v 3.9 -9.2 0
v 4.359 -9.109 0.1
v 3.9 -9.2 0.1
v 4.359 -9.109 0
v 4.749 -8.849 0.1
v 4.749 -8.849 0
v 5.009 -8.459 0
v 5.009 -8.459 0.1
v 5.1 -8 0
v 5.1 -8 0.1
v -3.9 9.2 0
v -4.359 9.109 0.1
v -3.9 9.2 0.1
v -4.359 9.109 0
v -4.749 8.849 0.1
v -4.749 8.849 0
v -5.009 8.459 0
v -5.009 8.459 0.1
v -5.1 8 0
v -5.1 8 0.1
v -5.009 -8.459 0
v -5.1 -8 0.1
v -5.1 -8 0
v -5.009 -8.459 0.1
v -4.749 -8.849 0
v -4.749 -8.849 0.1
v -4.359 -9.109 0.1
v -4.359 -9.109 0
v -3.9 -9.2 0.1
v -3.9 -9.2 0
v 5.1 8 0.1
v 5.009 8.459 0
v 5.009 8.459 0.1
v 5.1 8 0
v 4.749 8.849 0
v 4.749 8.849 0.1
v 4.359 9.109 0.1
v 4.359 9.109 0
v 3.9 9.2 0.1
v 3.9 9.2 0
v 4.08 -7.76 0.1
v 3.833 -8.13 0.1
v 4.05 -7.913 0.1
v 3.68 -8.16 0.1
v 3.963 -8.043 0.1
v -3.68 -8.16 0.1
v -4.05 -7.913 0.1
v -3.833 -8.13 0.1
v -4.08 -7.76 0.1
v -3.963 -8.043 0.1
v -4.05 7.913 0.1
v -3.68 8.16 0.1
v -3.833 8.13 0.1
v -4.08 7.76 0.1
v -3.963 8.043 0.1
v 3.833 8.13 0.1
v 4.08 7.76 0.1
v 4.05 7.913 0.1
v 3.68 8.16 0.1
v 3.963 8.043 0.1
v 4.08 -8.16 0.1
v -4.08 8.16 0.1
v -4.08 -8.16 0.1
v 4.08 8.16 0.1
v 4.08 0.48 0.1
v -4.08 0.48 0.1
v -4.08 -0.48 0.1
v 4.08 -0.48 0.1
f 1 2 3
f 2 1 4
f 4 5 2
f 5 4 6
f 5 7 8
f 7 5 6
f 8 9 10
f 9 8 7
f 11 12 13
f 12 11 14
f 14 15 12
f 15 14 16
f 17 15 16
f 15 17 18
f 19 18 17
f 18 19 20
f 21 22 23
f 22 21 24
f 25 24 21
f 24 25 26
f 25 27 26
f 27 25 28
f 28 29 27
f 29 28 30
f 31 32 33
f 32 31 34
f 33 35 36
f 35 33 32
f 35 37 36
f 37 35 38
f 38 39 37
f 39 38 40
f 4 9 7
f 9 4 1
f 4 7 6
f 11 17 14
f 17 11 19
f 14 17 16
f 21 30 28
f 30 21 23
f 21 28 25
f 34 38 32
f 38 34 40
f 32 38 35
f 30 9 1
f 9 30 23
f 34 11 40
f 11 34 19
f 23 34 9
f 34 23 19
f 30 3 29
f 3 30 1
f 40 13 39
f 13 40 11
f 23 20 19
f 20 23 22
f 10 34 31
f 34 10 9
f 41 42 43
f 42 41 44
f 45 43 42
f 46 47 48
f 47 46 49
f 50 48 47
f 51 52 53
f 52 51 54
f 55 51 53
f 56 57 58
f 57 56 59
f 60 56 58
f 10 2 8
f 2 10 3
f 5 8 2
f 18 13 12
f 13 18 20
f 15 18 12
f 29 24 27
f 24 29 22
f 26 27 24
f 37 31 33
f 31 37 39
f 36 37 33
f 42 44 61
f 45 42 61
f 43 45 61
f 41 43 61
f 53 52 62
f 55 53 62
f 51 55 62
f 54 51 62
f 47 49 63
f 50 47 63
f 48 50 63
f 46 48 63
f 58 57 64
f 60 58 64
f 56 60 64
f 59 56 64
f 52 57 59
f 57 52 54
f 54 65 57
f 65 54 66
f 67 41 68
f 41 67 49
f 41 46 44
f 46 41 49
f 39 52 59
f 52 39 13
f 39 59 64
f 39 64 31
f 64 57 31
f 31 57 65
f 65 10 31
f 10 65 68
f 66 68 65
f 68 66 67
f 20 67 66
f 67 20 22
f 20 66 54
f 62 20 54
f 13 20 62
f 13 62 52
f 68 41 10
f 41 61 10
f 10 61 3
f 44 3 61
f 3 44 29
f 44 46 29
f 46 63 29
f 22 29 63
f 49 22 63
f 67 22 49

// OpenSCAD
// file: ../p/1-4ndis.scad
use <../lib.scad>
function ldraw_lib__1_4ndis() = [
// 0 Disc Negative 0.25
// 0 Name: 1-4ndis.dat
// 0 Author: James Jessiman
// 0 !LDRAW_ORG Primitive UPDATE 2012-01
// 0 !LICENSE Licensed under CC BY 4.0 : see CAreadme.txt
// 
// 0 BFC CERTIFY CCW
  [0,"BFC","CERTIFY"],
  [0,"BFC","CCW"],
// 
// 0 !HISTORY 2002-03-23 [sbliss] Added BFC Statement
// 0 !HISTORY 2002-04-25 [PTadmin] Official Update 2002-02
// 0 !HISTORY 2007-06-22 [PTadmin] Header formatted for Contributor Agreement
// 0 !HISTORY 2008-07-01 [PTadmin] Official Update 2008-01
// 0 !HISTORY 2012-02-16 [Philo] Changed to CCW
// 0 !HISTORY 2012-03-30 [PTadmin] Official Update 2012-01
// 
// 
// 3 16 0.9239 0 0.3827 1 0 0 1 0 1
  [3,16,0.9239,0,0.3827,1,0,0,1,0,1],
// 3 16 0.7071 0 0.7071 0.9239 0 0.3827 1 0 1
  [3,16,0.7071,0,0.7071,0.9239,0,0.3827,1,0,1],
// 3 16 0.3827 0 0.9239 0.7071 0 0.7071 1 0 1
  [3,16,0.3827,0,0.9239,0.7071,0,0.7071,1,0,1],
// 3 16 0 0 1 0.3827 0 0.9239 1 0 1
  [3,16,0,0,1,0.3827,0,0.9239,1,0,1],
];
module ldraw_lib__1_4ndis(step=0, col=false, unit=2/5, alt=false, line=0.2, solid=!$preview)
    makepoly(ldraw_lib__1_4ndis(), step=step, col=col, unit=unit, alt=alt, line=line, solid=solid);
ldraw_lib__1_4ndis(line=0.2);
// file: ../p/1-4cyli.scad
use <../lib.scad>
function ldraw_lib__1_4cyli() = [
// 0 Cylinder 0.25
// 0 Name: 1-4cyli.dat
// 0 Author: James Jessiman
// 0 !LDRAW_ORG Primitive UPDATE 2012-01
// 0 !LICENSE Licensed under CC BY 4.0 : see CAreadme.txt
// 
// 0 BFC CERTIFY CCW
  [0,"BFC","CERTIFY"],
  [0,"BFC","CCW"],
// 
// 0 !HISTORY 2002-03-23 [sbliss] Added BFC statement.
// 0 !HISTORY 2002-04-25 [PTadmin] Official Update 2002-02
// 0 !HISTORY 2007-06-22 [PTadmin] Header formatted for Contributor Agreement
// 0 !HISTORY 2008-07-01 [PTadmin] Official Update 2008-01
// 0 !HISTORY 2012-02-16 [Philo] Changed to CCW
// 0 !HISTORY 2012-03-30 [PTadmin] Official Update 2012-01
// 
// 
// 4 16 1 1 0 0.9239 1 0.3827 0.9239 0 0.3827 1 0 0
  [4,16,1,1,0,0.9239,1,0.3827,0.9239,0,0.3827,1,0,0],
// 5 24 1 0 0 1 1 0 0.9239 0 0.3827 1 0 -1
  [5,24,1,0,0,1,1,0,0.9239,0,0.3827,1,0,-1],
// 4 16 0.9239 1 0.3827 0.7071 1 0.7071 0.7071 0 0.7071 0.9239 0 0.3827
  [4,16,0.9239,1,0.3827,0.7071,1,0.7071,0.7071,0,0.7071,0.9239,0,0.3827],
// 5 24 0.9239 0 0.3827 0.9239 1 0.3827 0.7071 0 0.7071 1 0 0
  [5,24,0.9239,0,0.3827,0.9239,1,0.3827,0.7071,0,0.7071,1,0,0],
// 4 16 0.7071 1 0.7071 0.3827 1 0.9239 0.3827 0 0.9239 0.7071 0 0.7071
  [4,16,0.7071,1,0.7071,0.3827,1,0.9239,0.3827,0,0.9239,0.7071,0,0.7071],
// 5 24 0.7071 0 0.7071 0.7071 1 0.7071 0.3827 0 0.9239 0.9239 0 0.3827
  [5,24,0.7071,0,0.7071,0.7071,1,0.7071,0.3827,0,0.9239,0.9239,0,0.3827],
// 4 16 0.3827 1 0.9239 0 1 1 0 0 1 0.3827 0 0.9239
  [4,16,0.3827,1,0.9239,0,1,1,0,0,1,0.3827,0,0.9239],
// 5 24 0.3827 0 0.9239 0.3827 1 0.9239 0 0 1 0.7071 0 0.7071
  [5,24,0.3827,0,0.9239,0.3827,1,0.9239,0,0,1,0.7071,0,0.7071],
// 5 24 0 0 1 0 1 1 0.3827 0 0.9239 -1 0 1
  [5,24,0,0,1,0,1,1,0.3827,0,0.9239,-1,0,1],
];
module ldraw_lib__1_4cyli(step=0, col=false, unit=2/5, alt=false, line=0.2, solid=!$preview)
    makepoly(ldraw_lib__1_4cyli(), step=step, col=col, unit=unit, alt=alt, line=line, solid=solid);
ldraw_lib__1_4cyli(line=0.2);
// file: ../p/1-4chrd.scad
use <../lib.scad>
function ldraw_lib__1_4chrd() = [
// 0 Chord 0.25
// 0 Name: 1-4chrd.dat
// 0 Author: Max Martin Richter [MMR1988]
// 0 !LDRAW_ORG Primitive UPDATE 2023-05
// 0 !LICENSE Licensed under CC BY 4.0 : see CAreadme.txt
// 
// 0 BFC CERTIFY CCW
  [0,"BFC","CERTIFY"],
  [0,"BFC","CCW"],
// 
// 0 !HISTORY 2004-04-22 [PTadmin] Official Update 2004-02
// 0 !HISTORY 2007-10-09 [PTadmin] Header formatted for Contributor Agreement
// 0 !HISTORY 2008-07-01 [PTadmin] Official Update 2008-01
// 0 !HISTORY 2012-08-02 [MMR1988] Re-creation with PrimGen2 and Rectifier
// 0 !HISTORY 2012-08-09 [PTadmin] Official Update 2012-02
// 0 !HISTORY 2023-10-27 [OrionP] Change author to MMR1988 from hafhead
// 0 !HISTORY 2023-10-31 [OrionP] Official Update 2023-05
// 
// 4 16 0.9239 0 0.3827 0.3827 0 0.9239 0 0 1 1 0 0
  [4,16,0.9239,0,0.3827,0.3827,0,0.9239,0,0,1,1,0,0],
// 3 16 0.7071 0 0.7071 0.3827 0 0.9239 0.9239 0 0.3827
  [3,16,0.7071,0,0.7071,0.3827,0,0.9239,0.9239,0,0.3827],
];
module ldraw_lib__1_4chrd(step=0, col=false, unit=2/5, alt=false, line=0.2, solid=!$preview)
    makepoly(ldraw_lib__1_4chrd(), step=step, col=col, unit=unit, alt=alt, line=line, solid=solid);
ldraw_lib__1_4chrd(line=0.2);
// main file
use <../lib.scad>
use <../p/1-4chrd.scad>
use <../p/1-4cyli.scad>
use <../p/1-4ndis.scad>
function ldraw_lib__004757e() = [
// 0 Sticker  2.3 x  1.3 with Black Train Window with Light Grey Trim
// 0 Name: 004757e.dat
// 0 Author: Takeshi Takahashi [RainbowDolphin]
// 0 !LDRAW_ORG Part UPDATE 2026-01
// 0 !LICENSE Licensed under CC BY 4.0 : see CAreadme.txt
// 
// 0 BFC CERTIFY CCW
  [0,"BFC","CERTIFY"],
  [0,"BFC","CCW"],
// 
// 0 !KEYWORDS Bricklink 164stk01, Brickowl 575181, Caboose, Passenger wagon
// 0 !KEYWORDS Rebrickable 4757stk, Set 164-1, Train
// 
// 0 !HISTORY 2020-01-07 [Plastikean] Original TEXMAP pattern for OMR
// 0 !HISTORY 2021-03-28 [RainbowDolphin] File preparation for LDraw Parts Tracker, vectorized the pattern
// 0 !HISTORY 2022-03-06 [PTadmin] Official Update 2022-02
// 0 !HISTORY 2026-01-23 [MagFors] Update description
// 0 !HISTORY 2026-01-29 [OrionP] Official Update 2026-01
// 
// 0 // Sticker box
// 1 16 9.75 0 -20 0 0 3 0 -.25 0 -3 0 0 1-4cyli.dat
  [1,16,9.75,0,-20,0,0,3,0,-.25,0,-3,0,0, ldraw_lib__1_4cyli()],
// 1 16 -9.75 0 20 0 0 -3 0 -.25 0 3 0 0 1-4cyli.dat
  [1,16,-9.75,0,20,0,0,-3,0,-.25,0,3,0,0, ldraw_lib__1_4cyli()],
// 1 16 -9.75 0 -20 -3 0 0 0 -.25 0 0 0 -3 1-4cyli.dat
  [1,16,-9.75,0,-20,-3,0,0,0,-.25,0,0,0,-3, ldraw_lib__1_4cyli()],
// 1 16 9.75 0 20 3 0 0 0 -.25 0 0 0 3 1-4cyli.dat
  [1,16,9.75,0,20,3,0,0,0,-.25,0,0,0,3, ldraw_lib__1_4cyli()],
// 1 16 9.75 0 -20 0 0 3 0 -1 0 -3 0 0 1-4chrd.dat
  [1,16,9.75,0,-20,0,0,3,0,-1,0,-3,0,0, ldraw_lib__1_4chrd()],
// 1 16 -9.75 0 20 0 0 -3 0 -1 0 3 0 0 1-4chrd.dat
  [1,16,-9.75,0,20,0,0,-3,0,-1,0,3,0,0, ldraw_lib__1_4chrd()],
// 1 16 -9.75 0 -20 -3 0 0 0 -1 0 0 0 -3 1-4chrd.dat
  [1,16,-9.75,0,-20,-3,0,0,0,-1,0,0,0,-3, ldraw_lib__1_4chrd()],
// 1 16 9.75 0 20 3 0 0 0 -1 0 0 0 3 1-4chrd.dat
  [1,16,9.75,0,20,3,0,0,0,-1,0,0,0,3, ldraw_lib__1_4chrd()],
// 4 16 9.75 0 -23 -9.75 0 -23 -12.75 0 -20 12.75 0 -20
  [4,16,9.75,0,-23,-9.75,0,-23,-12.75,0,-20,12.75,0,-20],
// 4 16 -12.75 0 20 -9.75 0 23 9.75 0 23 12.75 0 20
  [4,16,-12.75,0,20,-9.75,0,23,9.75,0,23,12.75,0,20],
// 4 16 12.75 0 20 12.75 0 -20 -12.75 0 -20 -12.75 0 20
  [4,16,12.75,0,20,12.75,0,-20,-12.75,0,-20,-12.75,0,20],
// 4 16 9.75 -.25 -23 -9.75 -.25 -23 -9.75 0 -23 9.75 0 -23
  [4,16,9.75,-.25,-23,-9.75,-.25,-23,-9.75,0,-23,9.75,0,-23],
// 4 16 -9.75 0 23 -9.75 -.25 23 9.75 -.25 23 9.75 0 23
  [4,16,-9.75,0,23,-9.75,-.25,23,9.75,-.25,23,9.75,0,23],
// 4 16 -12.75 0 20 -12.75 0 -20 -12.75 -.25 -20 -12.75 -.25 20
  [4,16,-12.75,0,20,-12.75,0,-20,-12.75,-.25,-20,-12.75,-.25,20],
// 4 16 12.75 -.25 -20 12.75 0 -20 12.75 0 20 12.75 -.25 20
  [4,16,12.75,-.25,-20,12.75,0,-20,12.75,0,20,12.75,-.25,20],
// 
// 1 0 9.2 -0.25 -19.4 0 0 1 0 1 0 -1 0 0 1-4chrd.dat
  [1,0,9.2,-0.25,-19.4,0,0,1,0,1,0,-1,0,0, ldraw_lib__1_4chrd()],
// 1 0 -9.2 -0.25 -19.4 -1 0 0 0 1 0 0 0 -1 1-4chrd.dat
  [1,0,-9.2,-0.25,-19.4,-1,0,0,0,1,0,0,0,-1, ldraw_lib__1_4chrd()],
// 1 0 -9.2 -0.25 19.4 0 0 -1 0 1 0 1 0 0 1-4chrd.dat
  [1,0,-9.2,-0.25,19.4,0,0,-1,0,1,0,1,0,0, ldraw_lib__1_4chrd()],
// 1 0 9.2 -0.25 19.4 1 0 0 0 1 0 0 0 1 1-4chrd.dat
  [1,0,9.2,-0.25,19.4,1,0,0,0,1,0,0,0,1, ldraw_lib__1_4chrd()],
// 1 7 9.75 -.25 -20 0 0 3 0 1 0 -3 0 0 1-4chrd.dat
  [1,7,9.75,-.25,-20,0,0,3,0,1,0,-3,0,0, ldraw_lib__1_4chrd()],
// 1 7 -9.75 -.25 20 0 0 -3 0 1 0 3 0 0 1-4chrd.dat
  [1,7,-9.75,-.25,20,0,0,-3,0,1,0,3,0,0, ldraw_lib__1_4chrd()],
// 1 7 -9.75 -.25 -20 -3 0 0 0 1 0 0 0 -3 1-4chrd.dat
  [1,7,-9.75,-.25,-20,-3,0,0,0,1,0,0,0,-3, ldraw_lib__1_4chrd()],
// 1 7 9.75 -.25 20 3 0 0 0 1 0 0 0 3 1-4chrd.dat
  [1,7,9.75,-.25,20,3,0,0,0,1,0,0,0,3, ldraw_lib__1_4chrd()],
// 1 7 9.2 -.25 -19.4 0 0 1 0 1 0 -1 0 0 1-4ndis.dat
  [1,7,9.2,-.25,-19.4,0,0,1,0,1,0,-1,0,0, ldraw_lib__1_4ndis()],
// 1 7 -9.2 -.25 19.4 0 0 -1 0 1 0 1 0 0 1-4ndis.dat
  [1,7,-9.2,-.25,19.4,0,0,-1,0,1,0,1,0,0, ldraw_lib__1_4ndis()],
// 1 7 -9.2 -.25 -19.4 -1 0 0 0 1 0 0 0 -1 1-4ndis.dat
  [1,7,-9.2,-.25,-19.4,-1,0,0,0,1,0,0,0,-1, ldraw_lib__1_4ndis()],
// 1 7 9.2 -.25 19.4 1 0 0 0 1 0 0 0 1 1-4ndis.dat
  [1,7,9.2,-.25,19.4,1,0,0,0,1,0,0,0,1, ldraw_lib__1_4ndis()],
// 4 0 9.2 -0.25 20.4 -9.2 -0.25 20.4 -10.2 -0.25 19.4 10.2 -0.25 19.4
  [4,0,9.2,-0.25,20.4,-9.2,-0.25,20.4,-10.2,-0.25,19.4,10.2,-0.25,19.4],
// 4 0 10.2 -0.25 19.4 -10.2 -0.25 19.4 -10.2 -0.25 1.2 10.2 -0.25 1.2
  [4,0,10.2,-0.25,19.4,-10.2,-0.25,19.4,-10.2,-0.25,1.2,10.2,-0.25,1.2],
// 4 0 10.2 -0.25 -1.2 -10.2 -0.25 -1.2 -10.2 -0.25 -19.4 10.2 -0.25 -19.4
  [4,0,10.2,-0.25,-1.2,-10.2,-0.25,-1.2,-10.2,-0.25,-19.4,10.2,-0.25,-19.4],
// 4 0 10.2 -0.25 -19.4 -10.2 -0.25 -19.4 -9.2 -0.25 -20.4 9.2 -0.25 -20.4
  [4,0,10.2,-0.25,-19.4,-10.2,-0.25,-19.4,-9.2,-0.25,-20.4,9.2,-0.25,-20.4],
// 4 7 9.75 -.25 23 -9.75 -.25 23 -9.2 -.25 20.4 9.2 -.25 20.4
  [4,7,9.75,-.25,23,-9.75,-.25,23,-9.2,-.25,20.4,9.2,-.25,20.4],
// 3 7 9.75 -.25 23 9.2 -.25 20.4 10.2 -.25 20.4
  [3,7,9.75,-.25,23,9.2,-.25,20.4,10.2,-.25,20.4],
// 3 7 9.75 -.25 23 10.2 -.25 20.4 12.75 -.25 20
  [3,7,9.75,-.25,23,10.2,-.25,20.4,12.75,-.25,20],
// 3 7 10.2 -.25 20.4 10.2 -.25 19.4 12.75 -.25 20
  [3,7,10.2,-.25,20.4,10.2,-.25,19.4,12.75,-.25,20],
// 3 7 12.75 -.25 20 10.2 -.25 19.4 10.2 -.25 1.2
  [3,7,12.75,-.25,20,10.2,-.25,19.4,10.2,-.25,1.2],
// 4 7 12.75 -.25 20 10.2 -.25 1.2 10.2 -.25 -1.2 12.75 -.25 -20
  [4,7,12.75,-.25,20,10.2,-.25,1.2,10.2,-.25,-1.2,12.75,-.25,-20],
// 4 7 -10.2 -.25 -1.2 10.2 -.25 -1.2 10.2 -.25 1.2 -10.2 -.25 1.2
  [4,7,-10.2,-.25,-1.2,10.2,-.25,-1.2,10.2,-.25,1.2,-10.2,-.25,1.2],
// 4 7 -10.2 -.25 -1.2 -10.2 -.25 1.2 -12.75 -.25 20 -12.75 -.25 -20
  [4,7,-10.2,-.25,-1.2,-10.2,-.25,1.2,-12.75,-.25,20,-12.75,-.25,-20],
// 3 7 -12.75 -.25 20 -10.2 -.25 1.2 -10.2 -.25 19.4
  [3,7,-12.75,-.25,20,-10.2,-.25,1.2,-10.2,-.25,19.4],
// 3 7 -10.2 -.25 20.4 -12.75 -.25 20 -10.2 -.25 19.4
  [3,7,-10.2,-.25,20.4,-12.75,-.25,20,-10.2,-.25,19.4],
// 3 7 -9.75 -.25 23 -12.75 -.25 20 -10.2 -.25 20.4
  [3,7,-9.75,-.25,23,-12.75,-.25,20,-10.2,-.25,20.4],
// 3 7 -9.75 -.25 23 -10.2 -.25 20.4 -9.2 -.25 20.4
  [3,7,-9.75,-.25,23,-10.2,-.25,20.4,-9.2,-.25,20.4],
// 3 7 10.2 -.25 -1.2 10.2 -.25 -19.4 12.75 -.25 -20
  [3,7,10.2,-.25,-1.2,10.2,-.25,-19.4,12.75,-.25,-20],
// 3 7 10.2 -.25 -19.4 10.2 -.25 -20.4 12.75 -.25 -20
  [3,7,10.2,-.25,-19.4,10.2,-.25,-20.4,12.75,-.25,-20],
// 3 7 12.75 -.25 -20 10.2 -.25 -20.4 9.75 -.25 -23
  [3,7,12.75,-.25,-20,10.2,-.25,-20.4,9.75,-.25,-23],
// 4 7 9.75 -.25 -23 10.2 -.25 -20.4 9.2 -.25 -20.4 -9.75 -.25 -23
  [4,7,9.75,-.25,-23,10.2,-.25,-20.4,9.2,-.25,-20.4,-9.75,-.25,-23],
// 3 7 9.2 -.25 -20.4 -9.2 -.25 -20.4 -9.75 -.25 -23
  [3,7,9.2,-.25,-20.4,-9.2,-.25,-20.4,-9.75,-.25,-23],
// 3 7 -9.2 -.25 -20.4 -10.2 -.25 -20.4 -9.75 -.25 -23
  [3,7,-9.2,-.25,-20.4,-10.2,-.25,-20.4,-9.75,-.25,-23],
// 3 7 -12.75 -.25 -20 -9.75 -.25 -23 -10.2 -.25 -20.4
  [3,7,-12.75,-.25,-20,-9.75,-.25,-23,-10.2,-.25,-20.4],
// 3 7 -10.2 -.25 -19.4 -12.75 -.25 -20 -10.2 -.25 -20.4
  [3,7,-10.2,-.25,-19.4,-12.75,-.25,-20,-10.2,-.25,-20.4],
// 3 7 -10.2 -.25 -1.2 -12.75 -.25 -20 -10.2 -.25 -19.4
  [3,7,-10.2,-.25,-1.2,-12.75,-.25,-20,-10.2,-.25,-19.4],
];
module ldraw_lib__004757e(step=0, col=false, unit=2/5, alt=false, line=0.2, solid=!$preview)
    makepoly(ldraw_lib__004757e(), step=step, col=col, unit=unit, alt=alt, line=line, solid=solid);
ldraw_lib__004757e(line=0.2);
